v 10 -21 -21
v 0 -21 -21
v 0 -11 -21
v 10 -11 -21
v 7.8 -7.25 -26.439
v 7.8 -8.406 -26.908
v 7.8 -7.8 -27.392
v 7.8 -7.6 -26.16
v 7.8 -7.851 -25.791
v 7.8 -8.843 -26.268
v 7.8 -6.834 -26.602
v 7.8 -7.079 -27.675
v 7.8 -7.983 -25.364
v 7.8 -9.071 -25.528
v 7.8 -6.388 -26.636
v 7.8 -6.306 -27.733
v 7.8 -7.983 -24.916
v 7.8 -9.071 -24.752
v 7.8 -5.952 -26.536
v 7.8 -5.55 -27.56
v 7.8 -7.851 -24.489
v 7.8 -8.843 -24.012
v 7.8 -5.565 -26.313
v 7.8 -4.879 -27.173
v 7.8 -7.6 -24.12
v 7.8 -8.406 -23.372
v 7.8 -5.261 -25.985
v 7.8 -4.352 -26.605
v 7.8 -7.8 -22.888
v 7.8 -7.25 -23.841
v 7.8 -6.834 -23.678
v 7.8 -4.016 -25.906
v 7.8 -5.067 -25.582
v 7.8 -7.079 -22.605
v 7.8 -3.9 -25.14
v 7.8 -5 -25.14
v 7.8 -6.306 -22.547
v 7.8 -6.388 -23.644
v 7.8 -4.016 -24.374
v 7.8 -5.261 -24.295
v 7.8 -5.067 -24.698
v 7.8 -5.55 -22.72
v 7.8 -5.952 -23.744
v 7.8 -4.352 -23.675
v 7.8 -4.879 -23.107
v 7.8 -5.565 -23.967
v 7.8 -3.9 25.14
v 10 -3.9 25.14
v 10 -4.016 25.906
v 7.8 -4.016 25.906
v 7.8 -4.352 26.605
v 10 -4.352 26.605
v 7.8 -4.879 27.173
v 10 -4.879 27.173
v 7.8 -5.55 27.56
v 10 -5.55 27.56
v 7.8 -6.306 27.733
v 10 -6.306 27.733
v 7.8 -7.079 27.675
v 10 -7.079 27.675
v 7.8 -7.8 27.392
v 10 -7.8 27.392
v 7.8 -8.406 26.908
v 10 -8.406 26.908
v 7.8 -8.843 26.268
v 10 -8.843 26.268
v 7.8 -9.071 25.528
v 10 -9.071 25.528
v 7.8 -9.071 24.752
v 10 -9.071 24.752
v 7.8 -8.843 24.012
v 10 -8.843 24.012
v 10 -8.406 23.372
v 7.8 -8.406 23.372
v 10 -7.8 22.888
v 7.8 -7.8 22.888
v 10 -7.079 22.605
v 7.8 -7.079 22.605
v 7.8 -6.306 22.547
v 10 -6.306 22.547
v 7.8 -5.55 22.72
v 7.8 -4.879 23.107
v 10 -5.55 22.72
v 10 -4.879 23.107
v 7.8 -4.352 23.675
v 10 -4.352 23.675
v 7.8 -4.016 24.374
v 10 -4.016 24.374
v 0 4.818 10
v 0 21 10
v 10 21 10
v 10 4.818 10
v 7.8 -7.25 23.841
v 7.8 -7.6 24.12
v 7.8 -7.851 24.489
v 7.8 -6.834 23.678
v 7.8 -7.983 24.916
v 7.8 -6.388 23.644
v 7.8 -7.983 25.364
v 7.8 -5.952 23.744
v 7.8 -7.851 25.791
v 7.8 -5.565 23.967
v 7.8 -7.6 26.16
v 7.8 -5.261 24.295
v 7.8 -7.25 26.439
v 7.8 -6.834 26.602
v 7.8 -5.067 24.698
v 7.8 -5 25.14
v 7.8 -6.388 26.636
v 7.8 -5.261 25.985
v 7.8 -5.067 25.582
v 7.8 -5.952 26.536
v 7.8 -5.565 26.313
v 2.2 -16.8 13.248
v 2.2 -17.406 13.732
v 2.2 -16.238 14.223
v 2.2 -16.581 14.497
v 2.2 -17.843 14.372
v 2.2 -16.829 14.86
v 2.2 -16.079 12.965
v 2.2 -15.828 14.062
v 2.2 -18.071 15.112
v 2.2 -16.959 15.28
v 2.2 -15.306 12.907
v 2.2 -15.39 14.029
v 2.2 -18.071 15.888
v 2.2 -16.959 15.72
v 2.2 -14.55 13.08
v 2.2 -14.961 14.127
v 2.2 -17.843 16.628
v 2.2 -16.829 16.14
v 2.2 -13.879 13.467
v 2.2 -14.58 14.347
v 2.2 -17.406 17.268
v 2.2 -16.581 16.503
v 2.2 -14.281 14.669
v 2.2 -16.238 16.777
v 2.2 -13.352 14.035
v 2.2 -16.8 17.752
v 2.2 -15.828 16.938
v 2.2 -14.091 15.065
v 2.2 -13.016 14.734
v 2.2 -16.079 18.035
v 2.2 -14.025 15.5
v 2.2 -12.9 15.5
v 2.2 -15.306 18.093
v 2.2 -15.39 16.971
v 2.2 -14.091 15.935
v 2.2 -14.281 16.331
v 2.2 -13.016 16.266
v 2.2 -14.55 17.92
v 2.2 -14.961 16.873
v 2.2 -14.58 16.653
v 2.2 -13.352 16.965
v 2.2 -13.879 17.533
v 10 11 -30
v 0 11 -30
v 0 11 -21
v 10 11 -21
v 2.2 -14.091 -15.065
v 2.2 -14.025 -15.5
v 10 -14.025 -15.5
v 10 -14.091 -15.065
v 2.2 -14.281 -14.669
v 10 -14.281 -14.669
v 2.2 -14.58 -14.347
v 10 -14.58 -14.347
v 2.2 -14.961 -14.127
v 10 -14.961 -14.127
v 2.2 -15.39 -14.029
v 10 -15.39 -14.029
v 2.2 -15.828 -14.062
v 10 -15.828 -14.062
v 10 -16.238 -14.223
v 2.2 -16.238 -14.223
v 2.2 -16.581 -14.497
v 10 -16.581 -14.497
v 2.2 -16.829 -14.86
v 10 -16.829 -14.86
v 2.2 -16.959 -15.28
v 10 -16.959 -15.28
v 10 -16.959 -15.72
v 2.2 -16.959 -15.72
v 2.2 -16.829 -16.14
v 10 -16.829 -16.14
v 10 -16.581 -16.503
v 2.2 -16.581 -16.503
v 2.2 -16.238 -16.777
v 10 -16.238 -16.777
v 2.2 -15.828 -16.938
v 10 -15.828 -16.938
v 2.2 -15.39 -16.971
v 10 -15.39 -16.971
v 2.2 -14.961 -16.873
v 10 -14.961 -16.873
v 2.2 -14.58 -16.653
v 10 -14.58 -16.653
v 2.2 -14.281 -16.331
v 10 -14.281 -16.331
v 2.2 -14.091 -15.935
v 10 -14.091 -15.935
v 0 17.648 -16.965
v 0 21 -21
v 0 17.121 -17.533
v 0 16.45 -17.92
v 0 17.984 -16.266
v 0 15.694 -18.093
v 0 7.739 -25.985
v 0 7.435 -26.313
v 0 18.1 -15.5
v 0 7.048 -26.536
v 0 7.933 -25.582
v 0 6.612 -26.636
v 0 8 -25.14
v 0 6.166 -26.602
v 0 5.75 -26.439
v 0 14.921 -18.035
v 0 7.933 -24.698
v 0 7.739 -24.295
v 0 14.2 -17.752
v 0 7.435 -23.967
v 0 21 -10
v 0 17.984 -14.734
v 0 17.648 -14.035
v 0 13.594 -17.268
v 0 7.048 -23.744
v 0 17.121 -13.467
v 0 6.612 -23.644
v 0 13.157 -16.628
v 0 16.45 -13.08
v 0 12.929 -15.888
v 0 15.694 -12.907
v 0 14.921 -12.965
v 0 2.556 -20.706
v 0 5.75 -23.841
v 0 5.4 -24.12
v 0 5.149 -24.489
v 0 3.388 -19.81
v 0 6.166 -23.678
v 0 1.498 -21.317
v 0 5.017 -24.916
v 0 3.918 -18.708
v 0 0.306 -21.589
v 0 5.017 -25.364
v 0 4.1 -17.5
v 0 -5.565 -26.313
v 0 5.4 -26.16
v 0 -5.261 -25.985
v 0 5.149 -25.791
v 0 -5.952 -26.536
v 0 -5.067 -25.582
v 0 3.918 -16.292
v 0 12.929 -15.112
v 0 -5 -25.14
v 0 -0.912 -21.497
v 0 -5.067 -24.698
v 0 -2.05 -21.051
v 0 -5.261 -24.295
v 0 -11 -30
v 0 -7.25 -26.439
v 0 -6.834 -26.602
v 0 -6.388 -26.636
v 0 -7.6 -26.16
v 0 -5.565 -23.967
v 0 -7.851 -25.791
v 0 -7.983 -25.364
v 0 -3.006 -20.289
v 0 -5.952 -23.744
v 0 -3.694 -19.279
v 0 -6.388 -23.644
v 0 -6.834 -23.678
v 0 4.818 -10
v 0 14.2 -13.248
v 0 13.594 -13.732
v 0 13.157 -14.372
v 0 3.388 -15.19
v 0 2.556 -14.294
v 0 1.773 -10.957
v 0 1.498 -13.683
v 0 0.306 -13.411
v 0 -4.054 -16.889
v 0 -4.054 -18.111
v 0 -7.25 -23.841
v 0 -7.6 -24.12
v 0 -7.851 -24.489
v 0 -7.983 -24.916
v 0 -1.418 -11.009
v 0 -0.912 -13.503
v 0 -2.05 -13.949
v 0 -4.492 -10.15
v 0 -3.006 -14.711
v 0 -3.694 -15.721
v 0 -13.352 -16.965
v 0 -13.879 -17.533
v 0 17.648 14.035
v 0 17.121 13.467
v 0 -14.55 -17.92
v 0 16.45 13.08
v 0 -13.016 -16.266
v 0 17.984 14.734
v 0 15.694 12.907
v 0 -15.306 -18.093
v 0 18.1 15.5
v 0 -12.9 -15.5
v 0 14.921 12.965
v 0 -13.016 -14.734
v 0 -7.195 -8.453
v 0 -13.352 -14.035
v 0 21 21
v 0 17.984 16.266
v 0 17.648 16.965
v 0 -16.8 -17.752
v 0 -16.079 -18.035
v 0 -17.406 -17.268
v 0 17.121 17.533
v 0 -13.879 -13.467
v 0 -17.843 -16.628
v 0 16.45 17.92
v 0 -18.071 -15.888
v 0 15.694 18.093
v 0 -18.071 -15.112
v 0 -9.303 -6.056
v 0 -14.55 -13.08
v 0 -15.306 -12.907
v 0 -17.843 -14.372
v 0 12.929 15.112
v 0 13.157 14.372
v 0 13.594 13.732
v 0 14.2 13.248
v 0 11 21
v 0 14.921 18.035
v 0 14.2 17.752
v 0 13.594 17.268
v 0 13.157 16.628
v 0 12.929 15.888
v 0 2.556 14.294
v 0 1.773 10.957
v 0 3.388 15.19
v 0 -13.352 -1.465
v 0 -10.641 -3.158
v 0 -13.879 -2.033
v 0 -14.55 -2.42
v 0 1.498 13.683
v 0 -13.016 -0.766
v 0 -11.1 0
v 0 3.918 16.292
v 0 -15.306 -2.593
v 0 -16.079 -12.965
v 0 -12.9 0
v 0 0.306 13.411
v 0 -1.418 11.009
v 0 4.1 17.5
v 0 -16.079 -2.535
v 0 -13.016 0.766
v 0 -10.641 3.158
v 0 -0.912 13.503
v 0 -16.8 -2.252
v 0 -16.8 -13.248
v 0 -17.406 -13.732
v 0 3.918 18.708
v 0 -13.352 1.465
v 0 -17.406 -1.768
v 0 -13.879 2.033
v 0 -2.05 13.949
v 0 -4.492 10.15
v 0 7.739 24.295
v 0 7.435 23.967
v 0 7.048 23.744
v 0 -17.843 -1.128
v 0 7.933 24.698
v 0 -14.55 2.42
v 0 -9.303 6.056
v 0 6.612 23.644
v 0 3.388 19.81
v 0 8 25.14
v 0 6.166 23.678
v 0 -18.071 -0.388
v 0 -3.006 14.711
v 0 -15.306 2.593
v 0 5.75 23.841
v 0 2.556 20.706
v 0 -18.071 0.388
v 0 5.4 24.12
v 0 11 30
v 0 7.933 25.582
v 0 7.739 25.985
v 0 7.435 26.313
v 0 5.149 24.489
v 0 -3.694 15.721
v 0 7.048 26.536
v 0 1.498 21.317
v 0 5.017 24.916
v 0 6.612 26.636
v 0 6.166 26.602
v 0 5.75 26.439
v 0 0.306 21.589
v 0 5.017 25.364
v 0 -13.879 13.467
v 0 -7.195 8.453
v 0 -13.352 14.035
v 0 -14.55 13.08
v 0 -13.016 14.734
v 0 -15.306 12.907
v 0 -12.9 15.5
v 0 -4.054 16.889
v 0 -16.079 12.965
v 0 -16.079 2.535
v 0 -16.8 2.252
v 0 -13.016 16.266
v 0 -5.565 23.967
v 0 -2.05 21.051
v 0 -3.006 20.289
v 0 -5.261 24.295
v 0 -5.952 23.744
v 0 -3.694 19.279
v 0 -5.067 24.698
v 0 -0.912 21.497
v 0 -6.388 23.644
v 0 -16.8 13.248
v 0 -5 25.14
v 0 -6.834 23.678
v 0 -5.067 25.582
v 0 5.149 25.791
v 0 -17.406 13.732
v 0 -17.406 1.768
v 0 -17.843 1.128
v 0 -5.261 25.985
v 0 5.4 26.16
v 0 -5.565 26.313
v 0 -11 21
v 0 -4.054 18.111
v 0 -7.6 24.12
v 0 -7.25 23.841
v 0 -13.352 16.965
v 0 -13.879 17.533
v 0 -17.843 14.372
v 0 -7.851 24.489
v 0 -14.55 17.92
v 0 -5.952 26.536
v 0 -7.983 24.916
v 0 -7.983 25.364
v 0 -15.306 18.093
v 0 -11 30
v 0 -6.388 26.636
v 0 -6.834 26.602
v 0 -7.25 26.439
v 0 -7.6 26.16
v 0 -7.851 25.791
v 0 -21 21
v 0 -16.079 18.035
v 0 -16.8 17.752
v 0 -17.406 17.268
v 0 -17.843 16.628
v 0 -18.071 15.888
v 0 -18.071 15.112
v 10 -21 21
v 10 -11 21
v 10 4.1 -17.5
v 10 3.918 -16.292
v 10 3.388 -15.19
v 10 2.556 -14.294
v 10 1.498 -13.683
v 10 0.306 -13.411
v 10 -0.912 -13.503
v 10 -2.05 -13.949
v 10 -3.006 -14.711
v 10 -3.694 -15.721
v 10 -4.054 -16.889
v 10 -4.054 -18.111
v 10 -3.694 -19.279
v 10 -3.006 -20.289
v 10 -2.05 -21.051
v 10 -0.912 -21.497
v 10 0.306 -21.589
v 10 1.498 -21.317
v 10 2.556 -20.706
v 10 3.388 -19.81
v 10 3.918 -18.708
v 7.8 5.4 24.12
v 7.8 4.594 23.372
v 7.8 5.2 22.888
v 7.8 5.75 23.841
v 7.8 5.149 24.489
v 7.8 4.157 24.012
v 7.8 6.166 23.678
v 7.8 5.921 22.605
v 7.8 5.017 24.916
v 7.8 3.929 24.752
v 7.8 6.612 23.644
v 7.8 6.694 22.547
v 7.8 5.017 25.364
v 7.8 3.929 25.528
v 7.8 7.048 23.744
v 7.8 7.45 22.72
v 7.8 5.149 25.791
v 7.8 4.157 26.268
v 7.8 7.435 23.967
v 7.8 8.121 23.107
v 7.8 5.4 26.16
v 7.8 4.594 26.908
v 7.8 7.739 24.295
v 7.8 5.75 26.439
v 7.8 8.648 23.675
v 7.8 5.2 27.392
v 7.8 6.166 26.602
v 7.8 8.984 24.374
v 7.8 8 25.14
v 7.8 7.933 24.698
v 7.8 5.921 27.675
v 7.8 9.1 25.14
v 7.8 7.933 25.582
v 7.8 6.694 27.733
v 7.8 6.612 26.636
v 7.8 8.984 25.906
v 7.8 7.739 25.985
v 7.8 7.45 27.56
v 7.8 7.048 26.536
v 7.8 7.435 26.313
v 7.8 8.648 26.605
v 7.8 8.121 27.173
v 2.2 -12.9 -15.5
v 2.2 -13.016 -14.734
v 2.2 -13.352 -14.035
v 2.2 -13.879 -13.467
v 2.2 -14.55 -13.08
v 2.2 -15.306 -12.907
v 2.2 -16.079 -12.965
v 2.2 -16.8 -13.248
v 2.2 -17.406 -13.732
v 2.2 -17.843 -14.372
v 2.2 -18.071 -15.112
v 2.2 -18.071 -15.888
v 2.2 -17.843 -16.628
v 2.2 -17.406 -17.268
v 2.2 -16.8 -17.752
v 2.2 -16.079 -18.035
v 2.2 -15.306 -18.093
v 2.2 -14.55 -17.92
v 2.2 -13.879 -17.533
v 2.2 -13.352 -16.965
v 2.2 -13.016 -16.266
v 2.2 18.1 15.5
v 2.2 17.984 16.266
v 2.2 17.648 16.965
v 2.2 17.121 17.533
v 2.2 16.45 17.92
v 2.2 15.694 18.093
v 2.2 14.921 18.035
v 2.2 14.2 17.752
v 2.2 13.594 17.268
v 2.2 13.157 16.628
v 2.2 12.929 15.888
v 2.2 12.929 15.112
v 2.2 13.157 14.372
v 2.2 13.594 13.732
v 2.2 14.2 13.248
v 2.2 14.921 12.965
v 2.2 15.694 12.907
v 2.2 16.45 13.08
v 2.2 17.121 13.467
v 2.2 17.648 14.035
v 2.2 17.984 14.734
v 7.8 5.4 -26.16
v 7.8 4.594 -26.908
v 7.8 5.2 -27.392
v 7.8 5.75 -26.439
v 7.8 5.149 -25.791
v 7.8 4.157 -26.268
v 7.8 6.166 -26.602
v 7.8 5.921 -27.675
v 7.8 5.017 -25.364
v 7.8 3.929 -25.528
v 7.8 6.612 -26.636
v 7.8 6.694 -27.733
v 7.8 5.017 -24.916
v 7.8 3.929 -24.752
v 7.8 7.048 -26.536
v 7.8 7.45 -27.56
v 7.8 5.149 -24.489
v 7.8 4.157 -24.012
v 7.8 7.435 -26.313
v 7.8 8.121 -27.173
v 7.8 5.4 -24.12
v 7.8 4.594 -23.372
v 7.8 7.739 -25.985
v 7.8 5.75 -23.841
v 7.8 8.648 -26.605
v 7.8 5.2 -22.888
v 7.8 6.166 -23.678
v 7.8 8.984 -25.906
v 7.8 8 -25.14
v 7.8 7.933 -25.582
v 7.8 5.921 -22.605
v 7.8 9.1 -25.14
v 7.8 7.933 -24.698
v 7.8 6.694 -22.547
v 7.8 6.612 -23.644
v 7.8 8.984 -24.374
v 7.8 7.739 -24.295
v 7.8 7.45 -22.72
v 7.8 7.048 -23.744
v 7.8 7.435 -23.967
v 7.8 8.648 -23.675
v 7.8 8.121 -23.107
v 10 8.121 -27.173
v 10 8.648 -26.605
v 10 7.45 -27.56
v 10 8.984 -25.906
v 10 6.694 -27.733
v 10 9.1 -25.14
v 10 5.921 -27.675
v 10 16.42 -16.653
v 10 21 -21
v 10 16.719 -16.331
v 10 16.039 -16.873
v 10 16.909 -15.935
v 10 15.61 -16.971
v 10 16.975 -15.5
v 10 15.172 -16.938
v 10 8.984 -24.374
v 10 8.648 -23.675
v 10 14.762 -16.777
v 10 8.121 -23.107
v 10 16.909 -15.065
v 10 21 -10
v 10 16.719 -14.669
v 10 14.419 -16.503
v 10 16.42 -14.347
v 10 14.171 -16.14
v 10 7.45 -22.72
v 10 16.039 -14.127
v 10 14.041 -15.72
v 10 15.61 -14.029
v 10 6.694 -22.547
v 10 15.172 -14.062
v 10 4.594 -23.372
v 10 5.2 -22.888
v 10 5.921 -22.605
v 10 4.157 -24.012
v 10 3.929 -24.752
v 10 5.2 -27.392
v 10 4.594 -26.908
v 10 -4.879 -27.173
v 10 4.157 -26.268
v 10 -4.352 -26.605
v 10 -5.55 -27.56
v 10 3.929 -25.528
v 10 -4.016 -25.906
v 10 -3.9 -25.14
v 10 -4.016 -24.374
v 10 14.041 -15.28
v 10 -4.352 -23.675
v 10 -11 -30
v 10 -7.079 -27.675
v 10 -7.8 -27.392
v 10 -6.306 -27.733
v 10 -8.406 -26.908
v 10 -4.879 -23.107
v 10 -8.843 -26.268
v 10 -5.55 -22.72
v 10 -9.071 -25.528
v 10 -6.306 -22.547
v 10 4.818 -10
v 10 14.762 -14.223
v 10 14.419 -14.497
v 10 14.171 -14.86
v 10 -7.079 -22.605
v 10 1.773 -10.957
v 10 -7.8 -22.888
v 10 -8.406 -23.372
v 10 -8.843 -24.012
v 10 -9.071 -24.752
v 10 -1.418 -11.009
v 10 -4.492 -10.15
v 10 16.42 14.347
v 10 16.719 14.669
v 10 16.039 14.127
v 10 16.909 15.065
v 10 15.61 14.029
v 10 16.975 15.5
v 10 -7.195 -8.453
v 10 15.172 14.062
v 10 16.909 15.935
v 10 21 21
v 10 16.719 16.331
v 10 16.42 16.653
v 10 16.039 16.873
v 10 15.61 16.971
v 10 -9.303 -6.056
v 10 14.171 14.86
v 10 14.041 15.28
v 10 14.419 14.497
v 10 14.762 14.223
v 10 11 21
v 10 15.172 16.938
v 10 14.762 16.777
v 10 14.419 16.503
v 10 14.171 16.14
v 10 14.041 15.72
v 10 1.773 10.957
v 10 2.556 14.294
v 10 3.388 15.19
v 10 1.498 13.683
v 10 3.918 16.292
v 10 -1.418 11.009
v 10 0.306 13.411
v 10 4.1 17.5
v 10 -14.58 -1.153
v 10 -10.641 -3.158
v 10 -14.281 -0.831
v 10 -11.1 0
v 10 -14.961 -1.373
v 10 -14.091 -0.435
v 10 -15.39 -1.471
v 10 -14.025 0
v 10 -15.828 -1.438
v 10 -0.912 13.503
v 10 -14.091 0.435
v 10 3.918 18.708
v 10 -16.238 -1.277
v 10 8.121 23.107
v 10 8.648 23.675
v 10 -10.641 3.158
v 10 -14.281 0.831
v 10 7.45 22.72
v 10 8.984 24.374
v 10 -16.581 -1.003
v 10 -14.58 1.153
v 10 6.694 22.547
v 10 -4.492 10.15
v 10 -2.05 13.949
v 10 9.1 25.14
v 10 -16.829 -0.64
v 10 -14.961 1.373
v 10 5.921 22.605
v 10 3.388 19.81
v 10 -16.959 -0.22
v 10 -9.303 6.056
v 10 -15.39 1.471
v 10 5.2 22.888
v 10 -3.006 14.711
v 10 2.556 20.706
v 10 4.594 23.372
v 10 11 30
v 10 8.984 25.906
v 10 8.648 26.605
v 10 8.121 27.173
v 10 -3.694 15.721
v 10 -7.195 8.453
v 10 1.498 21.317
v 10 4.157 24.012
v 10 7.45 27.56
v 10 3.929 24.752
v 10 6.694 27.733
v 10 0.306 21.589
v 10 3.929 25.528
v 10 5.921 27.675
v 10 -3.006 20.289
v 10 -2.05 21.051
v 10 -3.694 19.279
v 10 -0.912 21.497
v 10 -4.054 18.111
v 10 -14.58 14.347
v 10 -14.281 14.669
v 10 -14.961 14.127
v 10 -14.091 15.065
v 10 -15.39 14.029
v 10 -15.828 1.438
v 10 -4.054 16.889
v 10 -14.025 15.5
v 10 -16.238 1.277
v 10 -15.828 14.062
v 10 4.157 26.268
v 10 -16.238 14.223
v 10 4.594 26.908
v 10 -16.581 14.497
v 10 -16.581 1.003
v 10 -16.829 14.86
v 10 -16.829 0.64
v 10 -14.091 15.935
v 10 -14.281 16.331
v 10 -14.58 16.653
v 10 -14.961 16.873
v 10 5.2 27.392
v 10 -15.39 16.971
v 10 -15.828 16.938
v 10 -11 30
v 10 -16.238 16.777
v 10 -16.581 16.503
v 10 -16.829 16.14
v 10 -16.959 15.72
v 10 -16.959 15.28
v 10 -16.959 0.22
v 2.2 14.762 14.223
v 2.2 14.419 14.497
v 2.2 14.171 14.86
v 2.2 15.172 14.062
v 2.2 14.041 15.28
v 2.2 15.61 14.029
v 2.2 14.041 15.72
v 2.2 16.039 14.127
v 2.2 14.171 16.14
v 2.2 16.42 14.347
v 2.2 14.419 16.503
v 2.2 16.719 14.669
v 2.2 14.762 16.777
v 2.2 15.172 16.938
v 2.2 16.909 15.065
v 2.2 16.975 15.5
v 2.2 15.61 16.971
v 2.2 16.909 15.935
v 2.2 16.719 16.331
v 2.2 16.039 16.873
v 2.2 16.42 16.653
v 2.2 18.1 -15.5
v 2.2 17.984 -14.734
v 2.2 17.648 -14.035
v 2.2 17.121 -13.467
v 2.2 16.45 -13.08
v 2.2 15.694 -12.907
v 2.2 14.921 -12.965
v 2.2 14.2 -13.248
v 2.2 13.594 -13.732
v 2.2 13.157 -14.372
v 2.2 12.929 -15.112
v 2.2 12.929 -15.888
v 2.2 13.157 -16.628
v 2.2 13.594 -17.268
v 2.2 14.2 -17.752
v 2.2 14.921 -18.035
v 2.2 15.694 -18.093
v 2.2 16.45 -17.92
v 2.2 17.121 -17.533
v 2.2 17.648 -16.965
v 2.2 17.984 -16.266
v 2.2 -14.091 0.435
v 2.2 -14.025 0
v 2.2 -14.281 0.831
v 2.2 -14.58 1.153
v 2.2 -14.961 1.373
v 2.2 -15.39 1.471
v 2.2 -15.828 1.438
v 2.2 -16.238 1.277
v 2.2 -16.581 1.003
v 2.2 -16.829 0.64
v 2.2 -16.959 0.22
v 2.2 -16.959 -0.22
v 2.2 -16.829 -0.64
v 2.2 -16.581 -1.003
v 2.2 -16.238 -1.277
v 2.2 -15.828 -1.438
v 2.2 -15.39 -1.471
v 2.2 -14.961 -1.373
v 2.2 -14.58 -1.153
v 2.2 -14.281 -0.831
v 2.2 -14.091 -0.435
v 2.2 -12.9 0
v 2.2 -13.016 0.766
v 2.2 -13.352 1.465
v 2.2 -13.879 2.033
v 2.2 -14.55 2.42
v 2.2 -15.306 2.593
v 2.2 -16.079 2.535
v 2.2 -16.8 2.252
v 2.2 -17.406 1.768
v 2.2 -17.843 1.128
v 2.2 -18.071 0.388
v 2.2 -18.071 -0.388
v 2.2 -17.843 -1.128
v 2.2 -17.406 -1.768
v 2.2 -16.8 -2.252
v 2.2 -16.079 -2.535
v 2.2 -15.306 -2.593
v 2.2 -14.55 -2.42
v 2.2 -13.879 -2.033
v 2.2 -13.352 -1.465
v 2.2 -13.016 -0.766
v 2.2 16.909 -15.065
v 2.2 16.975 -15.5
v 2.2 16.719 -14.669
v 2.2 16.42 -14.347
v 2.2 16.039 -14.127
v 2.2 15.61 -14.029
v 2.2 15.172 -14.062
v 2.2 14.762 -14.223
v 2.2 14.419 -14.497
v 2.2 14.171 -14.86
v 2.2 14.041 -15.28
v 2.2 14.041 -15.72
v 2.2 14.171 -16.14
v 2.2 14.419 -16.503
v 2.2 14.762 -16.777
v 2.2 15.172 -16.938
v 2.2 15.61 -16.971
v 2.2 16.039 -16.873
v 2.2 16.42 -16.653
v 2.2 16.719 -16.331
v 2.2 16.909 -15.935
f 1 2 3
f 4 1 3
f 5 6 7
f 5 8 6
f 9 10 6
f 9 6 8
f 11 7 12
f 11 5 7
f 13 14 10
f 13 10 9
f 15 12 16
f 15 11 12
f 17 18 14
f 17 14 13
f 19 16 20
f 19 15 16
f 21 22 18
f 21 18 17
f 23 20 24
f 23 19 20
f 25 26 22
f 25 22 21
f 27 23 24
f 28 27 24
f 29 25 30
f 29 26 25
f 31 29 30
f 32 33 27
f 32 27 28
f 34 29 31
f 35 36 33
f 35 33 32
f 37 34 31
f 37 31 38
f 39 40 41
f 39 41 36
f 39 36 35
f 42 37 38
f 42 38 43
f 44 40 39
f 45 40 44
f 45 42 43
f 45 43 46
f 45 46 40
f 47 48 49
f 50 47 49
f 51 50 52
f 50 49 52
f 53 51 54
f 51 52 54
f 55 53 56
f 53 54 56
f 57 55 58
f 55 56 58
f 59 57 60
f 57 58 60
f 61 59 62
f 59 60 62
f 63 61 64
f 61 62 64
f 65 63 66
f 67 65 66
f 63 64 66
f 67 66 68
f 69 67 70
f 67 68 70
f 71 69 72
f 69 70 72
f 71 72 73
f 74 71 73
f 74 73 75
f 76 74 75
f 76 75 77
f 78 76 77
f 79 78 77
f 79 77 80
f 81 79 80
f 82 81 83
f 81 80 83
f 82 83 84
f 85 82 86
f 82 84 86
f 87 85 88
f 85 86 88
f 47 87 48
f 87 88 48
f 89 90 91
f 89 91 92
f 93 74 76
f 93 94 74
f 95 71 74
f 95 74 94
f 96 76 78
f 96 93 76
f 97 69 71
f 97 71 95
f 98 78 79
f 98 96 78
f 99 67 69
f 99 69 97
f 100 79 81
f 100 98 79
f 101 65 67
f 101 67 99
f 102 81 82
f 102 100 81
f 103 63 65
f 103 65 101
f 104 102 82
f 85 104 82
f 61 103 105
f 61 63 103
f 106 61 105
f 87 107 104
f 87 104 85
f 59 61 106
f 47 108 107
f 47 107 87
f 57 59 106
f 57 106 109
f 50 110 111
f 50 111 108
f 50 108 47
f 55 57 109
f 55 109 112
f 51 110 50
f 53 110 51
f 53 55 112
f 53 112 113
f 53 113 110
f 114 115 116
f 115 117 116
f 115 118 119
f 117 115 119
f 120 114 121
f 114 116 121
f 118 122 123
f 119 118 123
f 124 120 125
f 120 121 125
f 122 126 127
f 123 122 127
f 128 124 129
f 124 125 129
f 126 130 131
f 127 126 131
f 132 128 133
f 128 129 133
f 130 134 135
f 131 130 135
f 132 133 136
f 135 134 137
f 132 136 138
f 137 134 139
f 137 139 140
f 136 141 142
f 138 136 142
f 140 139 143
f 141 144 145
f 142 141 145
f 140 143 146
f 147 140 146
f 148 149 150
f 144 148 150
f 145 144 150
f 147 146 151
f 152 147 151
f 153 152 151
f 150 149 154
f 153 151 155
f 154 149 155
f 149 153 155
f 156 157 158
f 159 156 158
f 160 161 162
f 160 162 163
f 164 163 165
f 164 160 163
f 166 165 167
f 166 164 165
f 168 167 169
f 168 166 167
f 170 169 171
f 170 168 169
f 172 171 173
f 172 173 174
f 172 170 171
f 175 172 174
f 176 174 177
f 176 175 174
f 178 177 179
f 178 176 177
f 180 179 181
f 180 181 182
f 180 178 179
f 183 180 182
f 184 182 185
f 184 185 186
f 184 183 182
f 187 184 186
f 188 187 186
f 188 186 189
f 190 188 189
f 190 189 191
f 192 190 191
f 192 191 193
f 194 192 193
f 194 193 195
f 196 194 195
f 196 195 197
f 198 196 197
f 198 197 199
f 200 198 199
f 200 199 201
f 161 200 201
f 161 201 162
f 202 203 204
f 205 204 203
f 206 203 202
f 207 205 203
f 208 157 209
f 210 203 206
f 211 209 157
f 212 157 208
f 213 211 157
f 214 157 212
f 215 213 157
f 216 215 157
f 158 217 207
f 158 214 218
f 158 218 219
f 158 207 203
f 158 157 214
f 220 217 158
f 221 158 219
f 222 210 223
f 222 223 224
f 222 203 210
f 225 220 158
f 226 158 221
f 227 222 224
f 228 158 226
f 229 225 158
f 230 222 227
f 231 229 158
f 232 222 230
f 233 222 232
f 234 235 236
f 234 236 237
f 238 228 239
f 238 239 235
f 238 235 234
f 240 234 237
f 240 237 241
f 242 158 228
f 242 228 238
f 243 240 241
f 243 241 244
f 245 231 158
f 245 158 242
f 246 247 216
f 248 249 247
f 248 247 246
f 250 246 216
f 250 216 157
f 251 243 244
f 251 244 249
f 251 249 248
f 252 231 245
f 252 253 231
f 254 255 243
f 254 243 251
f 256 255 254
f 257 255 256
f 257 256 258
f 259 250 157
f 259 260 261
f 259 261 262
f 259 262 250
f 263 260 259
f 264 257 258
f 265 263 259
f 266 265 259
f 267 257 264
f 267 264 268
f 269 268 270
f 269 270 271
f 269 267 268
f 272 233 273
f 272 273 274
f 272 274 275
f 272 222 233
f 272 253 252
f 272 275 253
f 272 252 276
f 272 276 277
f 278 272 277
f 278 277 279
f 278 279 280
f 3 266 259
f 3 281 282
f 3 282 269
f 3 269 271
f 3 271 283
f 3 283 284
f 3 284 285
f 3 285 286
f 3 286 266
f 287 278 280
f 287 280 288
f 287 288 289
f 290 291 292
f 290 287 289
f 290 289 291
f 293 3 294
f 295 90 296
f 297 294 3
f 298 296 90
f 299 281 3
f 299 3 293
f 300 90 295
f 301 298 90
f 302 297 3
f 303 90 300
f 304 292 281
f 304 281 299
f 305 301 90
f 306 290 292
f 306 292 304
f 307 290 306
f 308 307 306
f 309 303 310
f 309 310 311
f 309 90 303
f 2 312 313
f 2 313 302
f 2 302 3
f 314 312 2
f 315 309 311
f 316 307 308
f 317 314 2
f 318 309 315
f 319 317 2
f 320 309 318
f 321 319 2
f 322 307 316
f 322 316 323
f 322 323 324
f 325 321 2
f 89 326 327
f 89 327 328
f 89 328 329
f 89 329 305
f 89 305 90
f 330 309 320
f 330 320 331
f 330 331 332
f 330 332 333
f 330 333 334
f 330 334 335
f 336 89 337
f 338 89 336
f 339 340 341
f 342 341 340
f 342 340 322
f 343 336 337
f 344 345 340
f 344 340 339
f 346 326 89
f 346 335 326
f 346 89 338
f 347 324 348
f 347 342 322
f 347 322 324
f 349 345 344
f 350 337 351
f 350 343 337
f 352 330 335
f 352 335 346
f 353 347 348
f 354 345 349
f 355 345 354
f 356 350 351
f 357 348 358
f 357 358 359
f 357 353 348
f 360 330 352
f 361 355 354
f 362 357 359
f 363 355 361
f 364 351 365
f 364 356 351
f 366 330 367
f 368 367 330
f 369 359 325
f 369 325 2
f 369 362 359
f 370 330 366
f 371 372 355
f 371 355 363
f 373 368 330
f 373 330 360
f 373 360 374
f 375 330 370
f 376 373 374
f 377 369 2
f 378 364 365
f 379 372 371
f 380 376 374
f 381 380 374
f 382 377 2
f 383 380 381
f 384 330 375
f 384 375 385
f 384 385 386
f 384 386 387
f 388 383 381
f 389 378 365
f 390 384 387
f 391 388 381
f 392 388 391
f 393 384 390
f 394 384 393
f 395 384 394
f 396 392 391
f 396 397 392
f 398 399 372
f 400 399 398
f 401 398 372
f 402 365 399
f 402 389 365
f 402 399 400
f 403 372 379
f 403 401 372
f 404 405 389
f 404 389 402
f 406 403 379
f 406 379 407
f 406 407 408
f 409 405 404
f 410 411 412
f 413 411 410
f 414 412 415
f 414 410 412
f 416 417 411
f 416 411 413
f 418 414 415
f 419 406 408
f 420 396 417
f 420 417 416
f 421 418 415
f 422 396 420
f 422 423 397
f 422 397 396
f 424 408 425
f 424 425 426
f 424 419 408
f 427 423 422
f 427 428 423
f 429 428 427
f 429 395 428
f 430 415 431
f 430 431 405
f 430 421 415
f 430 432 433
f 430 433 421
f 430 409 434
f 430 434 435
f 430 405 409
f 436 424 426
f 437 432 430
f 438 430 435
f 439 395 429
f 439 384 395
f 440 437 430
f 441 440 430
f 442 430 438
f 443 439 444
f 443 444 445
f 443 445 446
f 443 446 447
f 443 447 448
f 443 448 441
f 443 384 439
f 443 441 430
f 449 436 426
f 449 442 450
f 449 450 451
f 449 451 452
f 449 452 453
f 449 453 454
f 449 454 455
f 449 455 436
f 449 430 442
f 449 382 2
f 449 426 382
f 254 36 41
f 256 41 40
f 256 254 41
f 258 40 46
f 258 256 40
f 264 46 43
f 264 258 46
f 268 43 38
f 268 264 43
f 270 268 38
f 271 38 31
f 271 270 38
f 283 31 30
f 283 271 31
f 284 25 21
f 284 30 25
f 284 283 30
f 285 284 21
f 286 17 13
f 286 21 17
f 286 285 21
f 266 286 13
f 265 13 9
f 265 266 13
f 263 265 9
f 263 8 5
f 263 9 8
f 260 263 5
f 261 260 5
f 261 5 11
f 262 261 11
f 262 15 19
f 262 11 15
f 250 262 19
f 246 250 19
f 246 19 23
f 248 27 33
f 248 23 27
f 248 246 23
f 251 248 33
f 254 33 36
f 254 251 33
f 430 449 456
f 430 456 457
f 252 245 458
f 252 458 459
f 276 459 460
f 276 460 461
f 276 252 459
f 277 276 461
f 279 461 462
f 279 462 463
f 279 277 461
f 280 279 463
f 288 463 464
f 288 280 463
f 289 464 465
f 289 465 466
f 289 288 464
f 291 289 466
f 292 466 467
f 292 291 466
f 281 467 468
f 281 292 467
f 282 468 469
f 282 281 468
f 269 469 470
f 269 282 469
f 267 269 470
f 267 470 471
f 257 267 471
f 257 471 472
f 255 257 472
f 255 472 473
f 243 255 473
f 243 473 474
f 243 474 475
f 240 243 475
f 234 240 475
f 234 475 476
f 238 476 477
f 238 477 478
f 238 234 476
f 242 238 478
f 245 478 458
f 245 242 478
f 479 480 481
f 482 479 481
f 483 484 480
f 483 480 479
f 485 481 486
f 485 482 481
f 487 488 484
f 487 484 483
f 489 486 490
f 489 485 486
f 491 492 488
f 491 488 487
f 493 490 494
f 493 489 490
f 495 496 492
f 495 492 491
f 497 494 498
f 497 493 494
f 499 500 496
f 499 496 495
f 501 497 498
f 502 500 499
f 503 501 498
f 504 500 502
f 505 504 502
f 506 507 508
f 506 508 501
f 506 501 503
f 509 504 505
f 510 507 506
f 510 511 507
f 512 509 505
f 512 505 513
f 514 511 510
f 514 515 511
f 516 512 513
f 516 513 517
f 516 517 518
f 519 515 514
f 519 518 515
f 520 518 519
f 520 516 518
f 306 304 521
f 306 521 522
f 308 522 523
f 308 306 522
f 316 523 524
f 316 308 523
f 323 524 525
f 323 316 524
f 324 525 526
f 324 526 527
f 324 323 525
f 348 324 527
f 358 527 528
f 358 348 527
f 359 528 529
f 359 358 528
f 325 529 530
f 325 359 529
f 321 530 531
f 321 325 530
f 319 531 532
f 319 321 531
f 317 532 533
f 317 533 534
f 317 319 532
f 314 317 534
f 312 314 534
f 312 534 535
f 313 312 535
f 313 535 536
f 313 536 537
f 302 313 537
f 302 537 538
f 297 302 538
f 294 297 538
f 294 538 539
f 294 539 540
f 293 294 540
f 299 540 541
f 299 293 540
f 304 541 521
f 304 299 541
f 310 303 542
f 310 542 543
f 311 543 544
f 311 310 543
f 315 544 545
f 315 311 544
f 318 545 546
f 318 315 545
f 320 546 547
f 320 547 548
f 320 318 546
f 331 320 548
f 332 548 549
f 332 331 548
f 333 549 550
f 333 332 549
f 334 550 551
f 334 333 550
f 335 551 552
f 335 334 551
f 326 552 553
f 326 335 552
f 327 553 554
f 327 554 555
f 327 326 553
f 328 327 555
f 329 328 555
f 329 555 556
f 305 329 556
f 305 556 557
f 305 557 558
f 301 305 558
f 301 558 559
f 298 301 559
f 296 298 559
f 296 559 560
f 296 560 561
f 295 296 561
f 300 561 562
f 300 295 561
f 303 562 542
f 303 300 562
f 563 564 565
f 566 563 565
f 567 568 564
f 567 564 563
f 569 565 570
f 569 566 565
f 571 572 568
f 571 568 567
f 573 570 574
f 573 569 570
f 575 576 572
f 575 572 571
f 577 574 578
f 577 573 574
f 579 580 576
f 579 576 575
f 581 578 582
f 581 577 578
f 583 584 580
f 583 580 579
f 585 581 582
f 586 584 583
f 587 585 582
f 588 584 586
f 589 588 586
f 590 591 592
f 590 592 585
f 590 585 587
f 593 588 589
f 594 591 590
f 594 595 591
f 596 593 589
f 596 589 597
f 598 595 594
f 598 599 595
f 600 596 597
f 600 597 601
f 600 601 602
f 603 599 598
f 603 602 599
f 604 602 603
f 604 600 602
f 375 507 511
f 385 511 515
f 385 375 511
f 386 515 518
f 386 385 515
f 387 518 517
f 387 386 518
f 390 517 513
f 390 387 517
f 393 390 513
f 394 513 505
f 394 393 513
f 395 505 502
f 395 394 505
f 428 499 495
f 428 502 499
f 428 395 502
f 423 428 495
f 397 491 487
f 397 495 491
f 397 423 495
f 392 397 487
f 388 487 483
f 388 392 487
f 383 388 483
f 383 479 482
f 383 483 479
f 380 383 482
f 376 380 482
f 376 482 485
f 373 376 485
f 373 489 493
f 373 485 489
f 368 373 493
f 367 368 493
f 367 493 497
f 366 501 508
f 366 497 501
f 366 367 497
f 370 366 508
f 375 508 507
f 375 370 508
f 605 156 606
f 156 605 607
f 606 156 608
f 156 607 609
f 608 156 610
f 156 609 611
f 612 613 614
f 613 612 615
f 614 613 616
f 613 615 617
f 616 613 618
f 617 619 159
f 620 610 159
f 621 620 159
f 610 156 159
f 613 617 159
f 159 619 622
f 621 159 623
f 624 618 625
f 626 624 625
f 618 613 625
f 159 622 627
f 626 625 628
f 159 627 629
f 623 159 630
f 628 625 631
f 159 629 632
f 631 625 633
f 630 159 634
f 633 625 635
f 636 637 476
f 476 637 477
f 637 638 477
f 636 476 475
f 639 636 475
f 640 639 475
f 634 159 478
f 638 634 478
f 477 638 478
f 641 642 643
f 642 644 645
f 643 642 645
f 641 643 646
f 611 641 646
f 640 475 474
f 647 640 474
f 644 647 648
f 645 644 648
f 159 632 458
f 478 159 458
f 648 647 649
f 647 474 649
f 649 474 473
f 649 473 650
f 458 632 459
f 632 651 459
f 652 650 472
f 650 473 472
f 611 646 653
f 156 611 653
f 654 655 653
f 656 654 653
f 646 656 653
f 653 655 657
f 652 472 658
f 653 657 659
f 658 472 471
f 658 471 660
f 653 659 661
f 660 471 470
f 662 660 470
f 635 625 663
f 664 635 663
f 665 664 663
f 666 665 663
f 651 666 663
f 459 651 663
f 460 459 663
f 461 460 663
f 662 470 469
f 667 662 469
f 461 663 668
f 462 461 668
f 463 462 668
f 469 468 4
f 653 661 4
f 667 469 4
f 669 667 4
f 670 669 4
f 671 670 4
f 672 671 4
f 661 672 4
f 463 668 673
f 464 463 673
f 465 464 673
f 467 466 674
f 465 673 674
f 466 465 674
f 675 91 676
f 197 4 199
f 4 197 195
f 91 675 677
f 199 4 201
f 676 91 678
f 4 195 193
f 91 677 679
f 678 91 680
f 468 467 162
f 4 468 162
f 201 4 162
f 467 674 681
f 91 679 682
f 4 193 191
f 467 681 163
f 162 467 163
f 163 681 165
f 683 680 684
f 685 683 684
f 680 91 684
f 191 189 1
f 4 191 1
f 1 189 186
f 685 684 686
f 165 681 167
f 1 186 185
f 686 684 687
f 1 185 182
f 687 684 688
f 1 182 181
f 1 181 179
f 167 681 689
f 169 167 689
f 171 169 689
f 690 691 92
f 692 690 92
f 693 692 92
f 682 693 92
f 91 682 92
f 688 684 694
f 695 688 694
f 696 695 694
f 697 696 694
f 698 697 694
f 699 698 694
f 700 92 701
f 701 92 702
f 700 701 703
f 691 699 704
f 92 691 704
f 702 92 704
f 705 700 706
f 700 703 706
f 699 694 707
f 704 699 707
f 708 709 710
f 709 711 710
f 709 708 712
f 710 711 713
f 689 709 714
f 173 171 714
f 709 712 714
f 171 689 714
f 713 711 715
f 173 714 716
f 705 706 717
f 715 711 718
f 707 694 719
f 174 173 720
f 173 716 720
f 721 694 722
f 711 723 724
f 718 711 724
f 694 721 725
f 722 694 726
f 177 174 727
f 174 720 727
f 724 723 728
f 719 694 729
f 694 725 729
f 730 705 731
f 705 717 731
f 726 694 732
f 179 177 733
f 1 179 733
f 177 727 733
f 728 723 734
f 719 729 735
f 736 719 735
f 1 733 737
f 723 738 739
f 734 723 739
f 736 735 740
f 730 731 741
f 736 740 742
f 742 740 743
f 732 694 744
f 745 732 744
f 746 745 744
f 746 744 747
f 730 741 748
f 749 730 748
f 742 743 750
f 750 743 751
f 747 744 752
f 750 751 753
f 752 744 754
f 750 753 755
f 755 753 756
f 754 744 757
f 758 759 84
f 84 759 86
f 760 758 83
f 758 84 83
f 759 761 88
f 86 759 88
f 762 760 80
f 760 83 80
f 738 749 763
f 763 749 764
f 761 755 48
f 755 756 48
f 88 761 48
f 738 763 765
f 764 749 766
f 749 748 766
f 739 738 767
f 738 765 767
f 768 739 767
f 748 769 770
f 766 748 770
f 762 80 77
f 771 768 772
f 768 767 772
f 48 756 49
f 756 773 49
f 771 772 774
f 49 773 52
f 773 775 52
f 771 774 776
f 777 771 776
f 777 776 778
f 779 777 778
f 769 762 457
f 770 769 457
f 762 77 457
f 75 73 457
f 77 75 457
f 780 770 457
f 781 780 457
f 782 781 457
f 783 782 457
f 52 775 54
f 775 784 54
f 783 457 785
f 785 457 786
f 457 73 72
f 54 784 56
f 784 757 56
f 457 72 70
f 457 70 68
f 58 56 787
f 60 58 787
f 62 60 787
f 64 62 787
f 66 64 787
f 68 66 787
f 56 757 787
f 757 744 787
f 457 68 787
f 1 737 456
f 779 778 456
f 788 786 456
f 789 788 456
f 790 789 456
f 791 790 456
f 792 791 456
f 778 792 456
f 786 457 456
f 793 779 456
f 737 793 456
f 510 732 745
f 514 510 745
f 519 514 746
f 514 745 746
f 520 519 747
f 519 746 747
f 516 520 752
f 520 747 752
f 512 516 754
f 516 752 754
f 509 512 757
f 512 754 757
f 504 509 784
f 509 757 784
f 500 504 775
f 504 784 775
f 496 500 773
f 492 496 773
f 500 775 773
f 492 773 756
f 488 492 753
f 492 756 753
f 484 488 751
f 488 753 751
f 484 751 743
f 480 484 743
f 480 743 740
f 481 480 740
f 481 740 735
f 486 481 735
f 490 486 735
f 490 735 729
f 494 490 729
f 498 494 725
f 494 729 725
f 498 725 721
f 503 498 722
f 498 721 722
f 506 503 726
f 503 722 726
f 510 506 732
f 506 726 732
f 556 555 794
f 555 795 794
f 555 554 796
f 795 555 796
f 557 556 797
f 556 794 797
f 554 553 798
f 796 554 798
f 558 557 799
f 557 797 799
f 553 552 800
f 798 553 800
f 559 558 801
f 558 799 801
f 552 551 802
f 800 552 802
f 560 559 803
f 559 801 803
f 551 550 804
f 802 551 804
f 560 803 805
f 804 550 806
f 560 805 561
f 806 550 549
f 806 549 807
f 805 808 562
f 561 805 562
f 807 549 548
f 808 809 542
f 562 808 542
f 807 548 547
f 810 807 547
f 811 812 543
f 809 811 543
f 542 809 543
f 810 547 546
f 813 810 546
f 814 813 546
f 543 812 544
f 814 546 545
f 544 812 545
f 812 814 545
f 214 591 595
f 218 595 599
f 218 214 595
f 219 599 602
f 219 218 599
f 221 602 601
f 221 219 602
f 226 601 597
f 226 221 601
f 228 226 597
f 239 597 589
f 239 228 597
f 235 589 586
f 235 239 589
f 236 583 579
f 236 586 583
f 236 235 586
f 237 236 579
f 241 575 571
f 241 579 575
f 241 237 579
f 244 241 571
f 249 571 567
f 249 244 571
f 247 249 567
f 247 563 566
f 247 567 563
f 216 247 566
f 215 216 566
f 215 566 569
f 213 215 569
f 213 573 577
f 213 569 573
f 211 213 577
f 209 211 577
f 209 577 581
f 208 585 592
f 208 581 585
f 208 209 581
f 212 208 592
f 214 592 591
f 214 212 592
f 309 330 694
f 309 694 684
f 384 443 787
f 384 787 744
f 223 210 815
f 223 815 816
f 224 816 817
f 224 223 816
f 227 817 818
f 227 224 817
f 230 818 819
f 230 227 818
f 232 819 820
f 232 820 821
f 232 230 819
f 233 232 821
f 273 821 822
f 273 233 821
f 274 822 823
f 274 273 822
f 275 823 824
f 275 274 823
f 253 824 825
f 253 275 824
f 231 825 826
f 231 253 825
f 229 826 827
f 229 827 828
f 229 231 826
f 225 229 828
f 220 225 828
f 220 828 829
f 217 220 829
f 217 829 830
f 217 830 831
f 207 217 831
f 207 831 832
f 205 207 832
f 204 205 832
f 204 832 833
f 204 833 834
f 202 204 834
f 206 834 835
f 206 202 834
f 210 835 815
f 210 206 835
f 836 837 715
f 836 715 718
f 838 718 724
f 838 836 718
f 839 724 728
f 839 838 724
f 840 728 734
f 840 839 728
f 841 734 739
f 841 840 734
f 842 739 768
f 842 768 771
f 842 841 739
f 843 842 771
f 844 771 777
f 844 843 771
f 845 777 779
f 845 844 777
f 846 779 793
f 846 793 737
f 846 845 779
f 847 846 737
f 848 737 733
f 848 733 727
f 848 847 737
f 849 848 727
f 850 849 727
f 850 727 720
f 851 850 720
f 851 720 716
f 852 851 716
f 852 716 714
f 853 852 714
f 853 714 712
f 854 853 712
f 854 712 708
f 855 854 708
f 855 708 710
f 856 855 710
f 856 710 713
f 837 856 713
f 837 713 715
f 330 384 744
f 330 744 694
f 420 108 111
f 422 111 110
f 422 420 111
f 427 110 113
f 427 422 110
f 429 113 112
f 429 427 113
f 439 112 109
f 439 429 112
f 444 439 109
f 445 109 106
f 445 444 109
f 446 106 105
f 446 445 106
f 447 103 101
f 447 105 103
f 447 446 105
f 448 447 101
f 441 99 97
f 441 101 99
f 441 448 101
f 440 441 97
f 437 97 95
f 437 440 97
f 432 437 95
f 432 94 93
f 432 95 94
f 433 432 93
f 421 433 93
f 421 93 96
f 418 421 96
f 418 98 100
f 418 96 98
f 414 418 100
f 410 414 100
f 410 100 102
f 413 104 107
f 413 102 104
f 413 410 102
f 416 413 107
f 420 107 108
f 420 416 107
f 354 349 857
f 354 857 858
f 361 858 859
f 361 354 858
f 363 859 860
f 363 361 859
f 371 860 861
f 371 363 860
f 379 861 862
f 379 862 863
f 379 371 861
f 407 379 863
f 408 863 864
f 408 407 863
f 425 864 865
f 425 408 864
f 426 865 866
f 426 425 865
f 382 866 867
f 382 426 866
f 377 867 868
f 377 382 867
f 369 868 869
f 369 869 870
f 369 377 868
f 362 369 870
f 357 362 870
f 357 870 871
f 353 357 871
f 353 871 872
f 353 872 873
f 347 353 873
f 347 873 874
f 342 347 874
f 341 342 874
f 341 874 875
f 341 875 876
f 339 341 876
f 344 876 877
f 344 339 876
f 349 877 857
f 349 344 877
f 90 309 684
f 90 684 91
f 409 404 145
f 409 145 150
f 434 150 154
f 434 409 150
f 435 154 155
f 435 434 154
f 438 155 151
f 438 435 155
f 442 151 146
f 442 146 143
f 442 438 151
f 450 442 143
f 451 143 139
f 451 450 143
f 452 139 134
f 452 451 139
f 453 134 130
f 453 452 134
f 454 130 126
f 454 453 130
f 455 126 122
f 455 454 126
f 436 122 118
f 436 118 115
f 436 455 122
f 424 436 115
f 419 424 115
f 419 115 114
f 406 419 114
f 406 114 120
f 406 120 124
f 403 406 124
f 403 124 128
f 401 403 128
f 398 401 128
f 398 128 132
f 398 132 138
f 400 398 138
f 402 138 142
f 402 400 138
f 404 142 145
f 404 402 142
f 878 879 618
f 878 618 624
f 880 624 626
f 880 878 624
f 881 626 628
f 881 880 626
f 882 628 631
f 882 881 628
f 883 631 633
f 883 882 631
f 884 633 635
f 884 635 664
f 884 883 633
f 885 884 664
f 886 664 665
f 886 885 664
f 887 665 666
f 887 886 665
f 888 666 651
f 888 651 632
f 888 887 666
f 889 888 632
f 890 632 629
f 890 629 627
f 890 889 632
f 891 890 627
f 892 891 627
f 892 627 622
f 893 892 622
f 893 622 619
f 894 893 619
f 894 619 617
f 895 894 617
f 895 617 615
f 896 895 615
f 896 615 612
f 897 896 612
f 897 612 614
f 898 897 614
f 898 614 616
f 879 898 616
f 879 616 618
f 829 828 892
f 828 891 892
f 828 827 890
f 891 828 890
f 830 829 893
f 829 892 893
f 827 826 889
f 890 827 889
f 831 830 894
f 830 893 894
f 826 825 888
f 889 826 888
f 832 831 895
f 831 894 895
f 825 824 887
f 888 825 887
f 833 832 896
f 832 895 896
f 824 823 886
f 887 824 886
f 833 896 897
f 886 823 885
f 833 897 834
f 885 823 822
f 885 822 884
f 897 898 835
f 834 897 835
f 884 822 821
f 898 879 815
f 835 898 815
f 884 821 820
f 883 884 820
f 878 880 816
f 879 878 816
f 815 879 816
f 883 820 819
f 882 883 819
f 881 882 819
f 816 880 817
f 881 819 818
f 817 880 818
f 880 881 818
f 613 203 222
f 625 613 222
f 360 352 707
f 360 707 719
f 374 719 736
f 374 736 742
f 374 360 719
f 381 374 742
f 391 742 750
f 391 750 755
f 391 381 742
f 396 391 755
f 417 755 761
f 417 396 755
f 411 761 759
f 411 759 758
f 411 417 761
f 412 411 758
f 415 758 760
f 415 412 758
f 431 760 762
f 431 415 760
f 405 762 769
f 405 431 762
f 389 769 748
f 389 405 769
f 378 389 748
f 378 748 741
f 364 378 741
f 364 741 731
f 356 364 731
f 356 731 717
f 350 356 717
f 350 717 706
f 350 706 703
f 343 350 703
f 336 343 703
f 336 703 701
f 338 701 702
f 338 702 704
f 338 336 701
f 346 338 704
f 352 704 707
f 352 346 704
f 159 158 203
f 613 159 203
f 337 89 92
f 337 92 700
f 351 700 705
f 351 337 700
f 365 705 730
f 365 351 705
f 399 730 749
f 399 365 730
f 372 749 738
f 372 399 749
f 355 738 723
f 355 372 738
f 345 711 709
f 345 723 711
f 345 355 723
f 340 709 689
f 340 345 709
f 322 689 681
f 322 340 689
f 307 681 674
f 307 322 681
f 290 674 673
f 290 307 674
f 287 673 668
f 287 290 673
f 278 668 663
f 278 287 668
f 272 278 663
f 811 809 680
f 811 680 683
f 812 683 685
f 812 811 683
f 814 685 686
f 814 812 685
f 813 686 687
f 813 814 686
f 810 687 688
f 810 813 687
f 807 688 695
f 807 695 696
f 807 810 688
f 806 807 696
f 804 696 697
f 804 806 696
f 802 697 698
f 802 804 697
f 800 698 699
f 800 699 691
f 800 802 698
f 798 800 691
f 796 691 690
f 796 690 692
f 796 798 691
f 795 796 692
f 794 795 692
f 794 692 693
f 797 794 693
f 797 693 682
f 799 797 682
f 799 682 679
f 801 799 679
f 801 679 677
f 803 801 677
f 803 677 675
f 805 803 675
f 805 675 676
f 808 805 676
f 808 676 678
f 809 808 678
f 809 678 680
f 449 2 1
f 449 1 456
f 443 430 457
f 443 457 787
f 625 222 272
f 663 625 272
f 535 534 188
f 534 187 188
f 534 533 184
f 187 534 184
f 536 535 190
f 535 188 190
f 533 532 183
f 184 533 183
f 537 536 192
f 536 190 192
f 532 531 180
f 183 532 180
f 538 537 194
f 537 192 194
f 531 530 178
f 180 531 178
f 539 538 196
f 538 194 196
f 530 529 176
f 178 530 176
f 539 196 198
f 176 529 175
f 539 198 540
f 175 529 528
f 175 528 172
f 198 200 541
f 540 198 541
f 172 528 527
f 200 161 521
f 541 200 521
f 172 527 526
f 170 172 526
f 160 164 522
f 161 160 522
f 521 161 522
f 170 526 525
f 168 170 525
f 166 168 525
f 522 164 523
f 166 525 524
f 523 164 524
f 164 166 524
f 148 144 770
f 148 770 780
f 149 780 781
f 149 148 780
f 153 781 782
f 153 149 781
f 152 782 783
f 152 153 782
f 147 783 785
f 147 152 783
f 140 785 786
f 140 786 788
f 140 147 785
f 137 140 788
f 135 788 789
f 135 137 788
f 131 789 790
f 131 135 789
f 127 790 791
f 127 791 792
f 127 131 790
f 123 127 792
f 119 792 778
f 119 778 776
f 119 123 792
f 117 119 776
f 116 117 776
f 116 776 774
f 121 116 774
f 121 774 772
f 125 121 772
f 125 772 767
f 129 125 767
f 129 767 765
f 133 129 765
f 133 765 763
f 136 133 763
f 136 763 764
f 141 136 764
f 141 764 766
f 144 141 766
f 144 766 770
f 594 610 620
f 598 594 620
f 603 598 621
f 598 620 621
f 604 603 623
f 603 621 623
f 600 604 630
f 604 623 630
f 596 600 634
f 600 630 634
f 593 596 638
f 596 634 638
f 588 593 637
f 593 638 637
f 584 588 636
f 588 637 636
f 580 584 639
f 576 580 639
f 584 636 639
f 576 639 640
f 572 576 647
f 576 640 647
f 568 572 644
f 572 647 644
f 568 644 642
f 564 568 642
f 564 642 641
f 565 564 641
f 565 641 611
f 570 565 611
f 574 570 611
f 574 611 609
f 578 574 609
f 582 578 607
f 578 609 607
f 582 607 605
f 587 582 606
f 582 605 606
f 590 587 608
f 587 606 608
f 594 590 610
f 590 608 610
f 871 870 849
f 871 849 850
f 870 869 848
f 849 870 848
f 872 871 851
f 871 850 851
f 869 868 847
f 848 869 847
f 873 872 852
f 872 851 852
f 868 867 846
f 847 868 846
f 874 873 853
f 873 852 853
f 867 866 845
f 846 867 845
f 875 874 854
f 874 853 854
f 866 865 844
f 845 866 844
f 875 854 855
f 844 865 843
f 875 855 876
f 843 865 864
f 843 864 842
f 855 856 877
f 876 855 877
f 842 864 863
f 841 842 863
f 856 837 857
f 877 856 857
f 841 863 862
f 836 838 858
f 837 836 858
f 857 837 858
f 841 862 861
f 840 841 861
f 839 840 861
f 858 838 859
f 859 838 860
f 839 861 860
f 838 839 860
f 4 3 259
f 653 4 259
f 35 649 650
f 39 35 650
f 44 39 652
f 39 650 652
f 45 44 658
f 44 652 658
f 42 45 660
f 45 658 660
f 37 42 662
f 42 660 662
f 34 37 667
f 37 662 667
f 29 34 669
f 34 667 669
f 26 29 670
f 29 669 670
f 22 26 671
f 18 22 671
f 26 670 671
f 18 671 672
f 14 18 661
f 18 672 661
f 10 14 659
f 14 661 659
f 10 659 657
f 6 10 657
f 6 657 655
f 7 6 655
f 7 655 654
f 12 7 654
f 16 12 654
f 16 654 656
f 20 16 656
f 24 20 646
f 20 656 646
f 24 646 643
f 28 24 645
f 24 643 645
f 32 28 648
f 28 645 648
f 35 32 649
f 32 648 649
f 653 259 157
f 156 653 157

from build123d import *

# Parameters (mm, degrees)
SKETCH045_R     = 1.475
SKETCH045_R_2   = 4.1
SKETCH045_R_3   = 1.5
PAD013_DEPTH    = 10
SKETCH047_R     = 11.1
POCKET028_DEPTH = 10.001
SKETCH046_R     = 2.6
POCKET029_DEPTH = 2.2
SKETCH048_R     = 2.6
POCKET030_DEPTH = 2.2


with BuildPart() as part:
    # Sketch045 → Pad013 (new body)
    with BuildSketch(Plane.YZ):
        with BuildLine():
            Line((-21, -21), (-21, 21))
            Line((-21, 21), (-11, 21))
            Line((-11, 21), (-11, 30))
            Line((-11, 30), (11, 30))
            Line((11, 30), (11, 21))
            Line((11, 21), (21, 21))
            Line((21, 21), (21, 10))
            Line((21, 10), (0, 10))
            ThreePointArc((0, 10), (-10, 0), (0, -10))
            Line((21, -10), (0, -10))
            Line((21, -21), (21, -10))
            Line((11, -21), (21, -21))
            Line((11, -30), (11, -21))
            Line((-11, -30), (11, -30))
            Line((-11, -21), (-11, -30))
            Line((-21, -21), (-11, -21))
        make_face()
        with Locations((-15.5, 15.5)):
            Circle(SKETCH045_R, mode=Mode.SUBTRACT)
        with Locations((15.5, 15.5)):
            Circle(SKETCH045_R, mode=Mode.SUBTRACT)
        with Locations((-15.5, -15.5)):
            Circle(SKETCH045_R, mode=Mode.SUBTRACT)
        with Locations((15.5, -15.5)):
            Circle(SKETCH045_R, mode=Mode.SUBTRACT)
        with Locations((-15.5, 0)):
            Circle(SKETCH045_R, mode=Mode.SUBTRACT)
        with Locations((0, 17.5)):
            Circle(SKETCH045_R_2, mode=Mode.SUBTRACT)
        with Locations((0, -17.5)):
            Circle(SKETCH045_R_2, mode=Mode.SUBTRACT)
        with Locations((-6.5, 25.14)):
            Circle(SKETCH045_R_3, mode=Mode.SUBTRACT)
        with Locations((6.5, 25.14)):
            Circle(SKETCH045_R_3, mode=Mode.SUBTRACT)
        with Locations((-6.5, -25.14)):
            Circle(SKETCH045_R_3, mode=Mode.SUBTRACT)
        with Locations((6.5, -25.14)):
            Circle(SKETCH045_R_3, mode=Mode.SUBTRACT)
    extrude(amount=PAD013_DEPTH)

    # Sketch047 → Pocket028 (cut, through all)
    with BuildSketch(Plane.YZ):
        Circle(SKETCH047_R)
    extrude(amount=POCKET028_DEPTH, mode=Mode.SUBTRACT)

    # Sketch046 → Pocket029 (cut)
    with BuildSketch(Plane.YZ.offset(10)):
        with Locations((-6.5, 25.14)):
            Circle(SKETCH046_R)
        with Locations((6.5, 25.14)):
            Circle(SKETCH046_R)
        with Locations((-6.5, -25.14)):
            Circle(SKETCH046_R)
        with Locations((6.5, -25.14)):
            Circle(SKETCH046_R)
    extrude(amount=-POCKET029_DEPTH, mode=Mode.SUBTRACT)

    # Sketch048 → Pocket030 (cut)
    with BuildSketch(Plane.YZ):
        with Locations((-15.5, 15.5)):
            Circle(SKETCH048_R)
        with Locations((-15.5, 0)):
            Circle(SKETCH048_R)
        with Locations((-15.5, -15.5)):
            Circle(SKETCH048_R)
        with Locations((15.5, -15.5)):
            Circle(SKETCH048_R)
        with Locations((15.5, 15.5)):
            Circle(SKETCH048_R)
    extrude(amount=POCKET030_DEPTH, mode=Mode.SUBTRACT)


solid = part.part
